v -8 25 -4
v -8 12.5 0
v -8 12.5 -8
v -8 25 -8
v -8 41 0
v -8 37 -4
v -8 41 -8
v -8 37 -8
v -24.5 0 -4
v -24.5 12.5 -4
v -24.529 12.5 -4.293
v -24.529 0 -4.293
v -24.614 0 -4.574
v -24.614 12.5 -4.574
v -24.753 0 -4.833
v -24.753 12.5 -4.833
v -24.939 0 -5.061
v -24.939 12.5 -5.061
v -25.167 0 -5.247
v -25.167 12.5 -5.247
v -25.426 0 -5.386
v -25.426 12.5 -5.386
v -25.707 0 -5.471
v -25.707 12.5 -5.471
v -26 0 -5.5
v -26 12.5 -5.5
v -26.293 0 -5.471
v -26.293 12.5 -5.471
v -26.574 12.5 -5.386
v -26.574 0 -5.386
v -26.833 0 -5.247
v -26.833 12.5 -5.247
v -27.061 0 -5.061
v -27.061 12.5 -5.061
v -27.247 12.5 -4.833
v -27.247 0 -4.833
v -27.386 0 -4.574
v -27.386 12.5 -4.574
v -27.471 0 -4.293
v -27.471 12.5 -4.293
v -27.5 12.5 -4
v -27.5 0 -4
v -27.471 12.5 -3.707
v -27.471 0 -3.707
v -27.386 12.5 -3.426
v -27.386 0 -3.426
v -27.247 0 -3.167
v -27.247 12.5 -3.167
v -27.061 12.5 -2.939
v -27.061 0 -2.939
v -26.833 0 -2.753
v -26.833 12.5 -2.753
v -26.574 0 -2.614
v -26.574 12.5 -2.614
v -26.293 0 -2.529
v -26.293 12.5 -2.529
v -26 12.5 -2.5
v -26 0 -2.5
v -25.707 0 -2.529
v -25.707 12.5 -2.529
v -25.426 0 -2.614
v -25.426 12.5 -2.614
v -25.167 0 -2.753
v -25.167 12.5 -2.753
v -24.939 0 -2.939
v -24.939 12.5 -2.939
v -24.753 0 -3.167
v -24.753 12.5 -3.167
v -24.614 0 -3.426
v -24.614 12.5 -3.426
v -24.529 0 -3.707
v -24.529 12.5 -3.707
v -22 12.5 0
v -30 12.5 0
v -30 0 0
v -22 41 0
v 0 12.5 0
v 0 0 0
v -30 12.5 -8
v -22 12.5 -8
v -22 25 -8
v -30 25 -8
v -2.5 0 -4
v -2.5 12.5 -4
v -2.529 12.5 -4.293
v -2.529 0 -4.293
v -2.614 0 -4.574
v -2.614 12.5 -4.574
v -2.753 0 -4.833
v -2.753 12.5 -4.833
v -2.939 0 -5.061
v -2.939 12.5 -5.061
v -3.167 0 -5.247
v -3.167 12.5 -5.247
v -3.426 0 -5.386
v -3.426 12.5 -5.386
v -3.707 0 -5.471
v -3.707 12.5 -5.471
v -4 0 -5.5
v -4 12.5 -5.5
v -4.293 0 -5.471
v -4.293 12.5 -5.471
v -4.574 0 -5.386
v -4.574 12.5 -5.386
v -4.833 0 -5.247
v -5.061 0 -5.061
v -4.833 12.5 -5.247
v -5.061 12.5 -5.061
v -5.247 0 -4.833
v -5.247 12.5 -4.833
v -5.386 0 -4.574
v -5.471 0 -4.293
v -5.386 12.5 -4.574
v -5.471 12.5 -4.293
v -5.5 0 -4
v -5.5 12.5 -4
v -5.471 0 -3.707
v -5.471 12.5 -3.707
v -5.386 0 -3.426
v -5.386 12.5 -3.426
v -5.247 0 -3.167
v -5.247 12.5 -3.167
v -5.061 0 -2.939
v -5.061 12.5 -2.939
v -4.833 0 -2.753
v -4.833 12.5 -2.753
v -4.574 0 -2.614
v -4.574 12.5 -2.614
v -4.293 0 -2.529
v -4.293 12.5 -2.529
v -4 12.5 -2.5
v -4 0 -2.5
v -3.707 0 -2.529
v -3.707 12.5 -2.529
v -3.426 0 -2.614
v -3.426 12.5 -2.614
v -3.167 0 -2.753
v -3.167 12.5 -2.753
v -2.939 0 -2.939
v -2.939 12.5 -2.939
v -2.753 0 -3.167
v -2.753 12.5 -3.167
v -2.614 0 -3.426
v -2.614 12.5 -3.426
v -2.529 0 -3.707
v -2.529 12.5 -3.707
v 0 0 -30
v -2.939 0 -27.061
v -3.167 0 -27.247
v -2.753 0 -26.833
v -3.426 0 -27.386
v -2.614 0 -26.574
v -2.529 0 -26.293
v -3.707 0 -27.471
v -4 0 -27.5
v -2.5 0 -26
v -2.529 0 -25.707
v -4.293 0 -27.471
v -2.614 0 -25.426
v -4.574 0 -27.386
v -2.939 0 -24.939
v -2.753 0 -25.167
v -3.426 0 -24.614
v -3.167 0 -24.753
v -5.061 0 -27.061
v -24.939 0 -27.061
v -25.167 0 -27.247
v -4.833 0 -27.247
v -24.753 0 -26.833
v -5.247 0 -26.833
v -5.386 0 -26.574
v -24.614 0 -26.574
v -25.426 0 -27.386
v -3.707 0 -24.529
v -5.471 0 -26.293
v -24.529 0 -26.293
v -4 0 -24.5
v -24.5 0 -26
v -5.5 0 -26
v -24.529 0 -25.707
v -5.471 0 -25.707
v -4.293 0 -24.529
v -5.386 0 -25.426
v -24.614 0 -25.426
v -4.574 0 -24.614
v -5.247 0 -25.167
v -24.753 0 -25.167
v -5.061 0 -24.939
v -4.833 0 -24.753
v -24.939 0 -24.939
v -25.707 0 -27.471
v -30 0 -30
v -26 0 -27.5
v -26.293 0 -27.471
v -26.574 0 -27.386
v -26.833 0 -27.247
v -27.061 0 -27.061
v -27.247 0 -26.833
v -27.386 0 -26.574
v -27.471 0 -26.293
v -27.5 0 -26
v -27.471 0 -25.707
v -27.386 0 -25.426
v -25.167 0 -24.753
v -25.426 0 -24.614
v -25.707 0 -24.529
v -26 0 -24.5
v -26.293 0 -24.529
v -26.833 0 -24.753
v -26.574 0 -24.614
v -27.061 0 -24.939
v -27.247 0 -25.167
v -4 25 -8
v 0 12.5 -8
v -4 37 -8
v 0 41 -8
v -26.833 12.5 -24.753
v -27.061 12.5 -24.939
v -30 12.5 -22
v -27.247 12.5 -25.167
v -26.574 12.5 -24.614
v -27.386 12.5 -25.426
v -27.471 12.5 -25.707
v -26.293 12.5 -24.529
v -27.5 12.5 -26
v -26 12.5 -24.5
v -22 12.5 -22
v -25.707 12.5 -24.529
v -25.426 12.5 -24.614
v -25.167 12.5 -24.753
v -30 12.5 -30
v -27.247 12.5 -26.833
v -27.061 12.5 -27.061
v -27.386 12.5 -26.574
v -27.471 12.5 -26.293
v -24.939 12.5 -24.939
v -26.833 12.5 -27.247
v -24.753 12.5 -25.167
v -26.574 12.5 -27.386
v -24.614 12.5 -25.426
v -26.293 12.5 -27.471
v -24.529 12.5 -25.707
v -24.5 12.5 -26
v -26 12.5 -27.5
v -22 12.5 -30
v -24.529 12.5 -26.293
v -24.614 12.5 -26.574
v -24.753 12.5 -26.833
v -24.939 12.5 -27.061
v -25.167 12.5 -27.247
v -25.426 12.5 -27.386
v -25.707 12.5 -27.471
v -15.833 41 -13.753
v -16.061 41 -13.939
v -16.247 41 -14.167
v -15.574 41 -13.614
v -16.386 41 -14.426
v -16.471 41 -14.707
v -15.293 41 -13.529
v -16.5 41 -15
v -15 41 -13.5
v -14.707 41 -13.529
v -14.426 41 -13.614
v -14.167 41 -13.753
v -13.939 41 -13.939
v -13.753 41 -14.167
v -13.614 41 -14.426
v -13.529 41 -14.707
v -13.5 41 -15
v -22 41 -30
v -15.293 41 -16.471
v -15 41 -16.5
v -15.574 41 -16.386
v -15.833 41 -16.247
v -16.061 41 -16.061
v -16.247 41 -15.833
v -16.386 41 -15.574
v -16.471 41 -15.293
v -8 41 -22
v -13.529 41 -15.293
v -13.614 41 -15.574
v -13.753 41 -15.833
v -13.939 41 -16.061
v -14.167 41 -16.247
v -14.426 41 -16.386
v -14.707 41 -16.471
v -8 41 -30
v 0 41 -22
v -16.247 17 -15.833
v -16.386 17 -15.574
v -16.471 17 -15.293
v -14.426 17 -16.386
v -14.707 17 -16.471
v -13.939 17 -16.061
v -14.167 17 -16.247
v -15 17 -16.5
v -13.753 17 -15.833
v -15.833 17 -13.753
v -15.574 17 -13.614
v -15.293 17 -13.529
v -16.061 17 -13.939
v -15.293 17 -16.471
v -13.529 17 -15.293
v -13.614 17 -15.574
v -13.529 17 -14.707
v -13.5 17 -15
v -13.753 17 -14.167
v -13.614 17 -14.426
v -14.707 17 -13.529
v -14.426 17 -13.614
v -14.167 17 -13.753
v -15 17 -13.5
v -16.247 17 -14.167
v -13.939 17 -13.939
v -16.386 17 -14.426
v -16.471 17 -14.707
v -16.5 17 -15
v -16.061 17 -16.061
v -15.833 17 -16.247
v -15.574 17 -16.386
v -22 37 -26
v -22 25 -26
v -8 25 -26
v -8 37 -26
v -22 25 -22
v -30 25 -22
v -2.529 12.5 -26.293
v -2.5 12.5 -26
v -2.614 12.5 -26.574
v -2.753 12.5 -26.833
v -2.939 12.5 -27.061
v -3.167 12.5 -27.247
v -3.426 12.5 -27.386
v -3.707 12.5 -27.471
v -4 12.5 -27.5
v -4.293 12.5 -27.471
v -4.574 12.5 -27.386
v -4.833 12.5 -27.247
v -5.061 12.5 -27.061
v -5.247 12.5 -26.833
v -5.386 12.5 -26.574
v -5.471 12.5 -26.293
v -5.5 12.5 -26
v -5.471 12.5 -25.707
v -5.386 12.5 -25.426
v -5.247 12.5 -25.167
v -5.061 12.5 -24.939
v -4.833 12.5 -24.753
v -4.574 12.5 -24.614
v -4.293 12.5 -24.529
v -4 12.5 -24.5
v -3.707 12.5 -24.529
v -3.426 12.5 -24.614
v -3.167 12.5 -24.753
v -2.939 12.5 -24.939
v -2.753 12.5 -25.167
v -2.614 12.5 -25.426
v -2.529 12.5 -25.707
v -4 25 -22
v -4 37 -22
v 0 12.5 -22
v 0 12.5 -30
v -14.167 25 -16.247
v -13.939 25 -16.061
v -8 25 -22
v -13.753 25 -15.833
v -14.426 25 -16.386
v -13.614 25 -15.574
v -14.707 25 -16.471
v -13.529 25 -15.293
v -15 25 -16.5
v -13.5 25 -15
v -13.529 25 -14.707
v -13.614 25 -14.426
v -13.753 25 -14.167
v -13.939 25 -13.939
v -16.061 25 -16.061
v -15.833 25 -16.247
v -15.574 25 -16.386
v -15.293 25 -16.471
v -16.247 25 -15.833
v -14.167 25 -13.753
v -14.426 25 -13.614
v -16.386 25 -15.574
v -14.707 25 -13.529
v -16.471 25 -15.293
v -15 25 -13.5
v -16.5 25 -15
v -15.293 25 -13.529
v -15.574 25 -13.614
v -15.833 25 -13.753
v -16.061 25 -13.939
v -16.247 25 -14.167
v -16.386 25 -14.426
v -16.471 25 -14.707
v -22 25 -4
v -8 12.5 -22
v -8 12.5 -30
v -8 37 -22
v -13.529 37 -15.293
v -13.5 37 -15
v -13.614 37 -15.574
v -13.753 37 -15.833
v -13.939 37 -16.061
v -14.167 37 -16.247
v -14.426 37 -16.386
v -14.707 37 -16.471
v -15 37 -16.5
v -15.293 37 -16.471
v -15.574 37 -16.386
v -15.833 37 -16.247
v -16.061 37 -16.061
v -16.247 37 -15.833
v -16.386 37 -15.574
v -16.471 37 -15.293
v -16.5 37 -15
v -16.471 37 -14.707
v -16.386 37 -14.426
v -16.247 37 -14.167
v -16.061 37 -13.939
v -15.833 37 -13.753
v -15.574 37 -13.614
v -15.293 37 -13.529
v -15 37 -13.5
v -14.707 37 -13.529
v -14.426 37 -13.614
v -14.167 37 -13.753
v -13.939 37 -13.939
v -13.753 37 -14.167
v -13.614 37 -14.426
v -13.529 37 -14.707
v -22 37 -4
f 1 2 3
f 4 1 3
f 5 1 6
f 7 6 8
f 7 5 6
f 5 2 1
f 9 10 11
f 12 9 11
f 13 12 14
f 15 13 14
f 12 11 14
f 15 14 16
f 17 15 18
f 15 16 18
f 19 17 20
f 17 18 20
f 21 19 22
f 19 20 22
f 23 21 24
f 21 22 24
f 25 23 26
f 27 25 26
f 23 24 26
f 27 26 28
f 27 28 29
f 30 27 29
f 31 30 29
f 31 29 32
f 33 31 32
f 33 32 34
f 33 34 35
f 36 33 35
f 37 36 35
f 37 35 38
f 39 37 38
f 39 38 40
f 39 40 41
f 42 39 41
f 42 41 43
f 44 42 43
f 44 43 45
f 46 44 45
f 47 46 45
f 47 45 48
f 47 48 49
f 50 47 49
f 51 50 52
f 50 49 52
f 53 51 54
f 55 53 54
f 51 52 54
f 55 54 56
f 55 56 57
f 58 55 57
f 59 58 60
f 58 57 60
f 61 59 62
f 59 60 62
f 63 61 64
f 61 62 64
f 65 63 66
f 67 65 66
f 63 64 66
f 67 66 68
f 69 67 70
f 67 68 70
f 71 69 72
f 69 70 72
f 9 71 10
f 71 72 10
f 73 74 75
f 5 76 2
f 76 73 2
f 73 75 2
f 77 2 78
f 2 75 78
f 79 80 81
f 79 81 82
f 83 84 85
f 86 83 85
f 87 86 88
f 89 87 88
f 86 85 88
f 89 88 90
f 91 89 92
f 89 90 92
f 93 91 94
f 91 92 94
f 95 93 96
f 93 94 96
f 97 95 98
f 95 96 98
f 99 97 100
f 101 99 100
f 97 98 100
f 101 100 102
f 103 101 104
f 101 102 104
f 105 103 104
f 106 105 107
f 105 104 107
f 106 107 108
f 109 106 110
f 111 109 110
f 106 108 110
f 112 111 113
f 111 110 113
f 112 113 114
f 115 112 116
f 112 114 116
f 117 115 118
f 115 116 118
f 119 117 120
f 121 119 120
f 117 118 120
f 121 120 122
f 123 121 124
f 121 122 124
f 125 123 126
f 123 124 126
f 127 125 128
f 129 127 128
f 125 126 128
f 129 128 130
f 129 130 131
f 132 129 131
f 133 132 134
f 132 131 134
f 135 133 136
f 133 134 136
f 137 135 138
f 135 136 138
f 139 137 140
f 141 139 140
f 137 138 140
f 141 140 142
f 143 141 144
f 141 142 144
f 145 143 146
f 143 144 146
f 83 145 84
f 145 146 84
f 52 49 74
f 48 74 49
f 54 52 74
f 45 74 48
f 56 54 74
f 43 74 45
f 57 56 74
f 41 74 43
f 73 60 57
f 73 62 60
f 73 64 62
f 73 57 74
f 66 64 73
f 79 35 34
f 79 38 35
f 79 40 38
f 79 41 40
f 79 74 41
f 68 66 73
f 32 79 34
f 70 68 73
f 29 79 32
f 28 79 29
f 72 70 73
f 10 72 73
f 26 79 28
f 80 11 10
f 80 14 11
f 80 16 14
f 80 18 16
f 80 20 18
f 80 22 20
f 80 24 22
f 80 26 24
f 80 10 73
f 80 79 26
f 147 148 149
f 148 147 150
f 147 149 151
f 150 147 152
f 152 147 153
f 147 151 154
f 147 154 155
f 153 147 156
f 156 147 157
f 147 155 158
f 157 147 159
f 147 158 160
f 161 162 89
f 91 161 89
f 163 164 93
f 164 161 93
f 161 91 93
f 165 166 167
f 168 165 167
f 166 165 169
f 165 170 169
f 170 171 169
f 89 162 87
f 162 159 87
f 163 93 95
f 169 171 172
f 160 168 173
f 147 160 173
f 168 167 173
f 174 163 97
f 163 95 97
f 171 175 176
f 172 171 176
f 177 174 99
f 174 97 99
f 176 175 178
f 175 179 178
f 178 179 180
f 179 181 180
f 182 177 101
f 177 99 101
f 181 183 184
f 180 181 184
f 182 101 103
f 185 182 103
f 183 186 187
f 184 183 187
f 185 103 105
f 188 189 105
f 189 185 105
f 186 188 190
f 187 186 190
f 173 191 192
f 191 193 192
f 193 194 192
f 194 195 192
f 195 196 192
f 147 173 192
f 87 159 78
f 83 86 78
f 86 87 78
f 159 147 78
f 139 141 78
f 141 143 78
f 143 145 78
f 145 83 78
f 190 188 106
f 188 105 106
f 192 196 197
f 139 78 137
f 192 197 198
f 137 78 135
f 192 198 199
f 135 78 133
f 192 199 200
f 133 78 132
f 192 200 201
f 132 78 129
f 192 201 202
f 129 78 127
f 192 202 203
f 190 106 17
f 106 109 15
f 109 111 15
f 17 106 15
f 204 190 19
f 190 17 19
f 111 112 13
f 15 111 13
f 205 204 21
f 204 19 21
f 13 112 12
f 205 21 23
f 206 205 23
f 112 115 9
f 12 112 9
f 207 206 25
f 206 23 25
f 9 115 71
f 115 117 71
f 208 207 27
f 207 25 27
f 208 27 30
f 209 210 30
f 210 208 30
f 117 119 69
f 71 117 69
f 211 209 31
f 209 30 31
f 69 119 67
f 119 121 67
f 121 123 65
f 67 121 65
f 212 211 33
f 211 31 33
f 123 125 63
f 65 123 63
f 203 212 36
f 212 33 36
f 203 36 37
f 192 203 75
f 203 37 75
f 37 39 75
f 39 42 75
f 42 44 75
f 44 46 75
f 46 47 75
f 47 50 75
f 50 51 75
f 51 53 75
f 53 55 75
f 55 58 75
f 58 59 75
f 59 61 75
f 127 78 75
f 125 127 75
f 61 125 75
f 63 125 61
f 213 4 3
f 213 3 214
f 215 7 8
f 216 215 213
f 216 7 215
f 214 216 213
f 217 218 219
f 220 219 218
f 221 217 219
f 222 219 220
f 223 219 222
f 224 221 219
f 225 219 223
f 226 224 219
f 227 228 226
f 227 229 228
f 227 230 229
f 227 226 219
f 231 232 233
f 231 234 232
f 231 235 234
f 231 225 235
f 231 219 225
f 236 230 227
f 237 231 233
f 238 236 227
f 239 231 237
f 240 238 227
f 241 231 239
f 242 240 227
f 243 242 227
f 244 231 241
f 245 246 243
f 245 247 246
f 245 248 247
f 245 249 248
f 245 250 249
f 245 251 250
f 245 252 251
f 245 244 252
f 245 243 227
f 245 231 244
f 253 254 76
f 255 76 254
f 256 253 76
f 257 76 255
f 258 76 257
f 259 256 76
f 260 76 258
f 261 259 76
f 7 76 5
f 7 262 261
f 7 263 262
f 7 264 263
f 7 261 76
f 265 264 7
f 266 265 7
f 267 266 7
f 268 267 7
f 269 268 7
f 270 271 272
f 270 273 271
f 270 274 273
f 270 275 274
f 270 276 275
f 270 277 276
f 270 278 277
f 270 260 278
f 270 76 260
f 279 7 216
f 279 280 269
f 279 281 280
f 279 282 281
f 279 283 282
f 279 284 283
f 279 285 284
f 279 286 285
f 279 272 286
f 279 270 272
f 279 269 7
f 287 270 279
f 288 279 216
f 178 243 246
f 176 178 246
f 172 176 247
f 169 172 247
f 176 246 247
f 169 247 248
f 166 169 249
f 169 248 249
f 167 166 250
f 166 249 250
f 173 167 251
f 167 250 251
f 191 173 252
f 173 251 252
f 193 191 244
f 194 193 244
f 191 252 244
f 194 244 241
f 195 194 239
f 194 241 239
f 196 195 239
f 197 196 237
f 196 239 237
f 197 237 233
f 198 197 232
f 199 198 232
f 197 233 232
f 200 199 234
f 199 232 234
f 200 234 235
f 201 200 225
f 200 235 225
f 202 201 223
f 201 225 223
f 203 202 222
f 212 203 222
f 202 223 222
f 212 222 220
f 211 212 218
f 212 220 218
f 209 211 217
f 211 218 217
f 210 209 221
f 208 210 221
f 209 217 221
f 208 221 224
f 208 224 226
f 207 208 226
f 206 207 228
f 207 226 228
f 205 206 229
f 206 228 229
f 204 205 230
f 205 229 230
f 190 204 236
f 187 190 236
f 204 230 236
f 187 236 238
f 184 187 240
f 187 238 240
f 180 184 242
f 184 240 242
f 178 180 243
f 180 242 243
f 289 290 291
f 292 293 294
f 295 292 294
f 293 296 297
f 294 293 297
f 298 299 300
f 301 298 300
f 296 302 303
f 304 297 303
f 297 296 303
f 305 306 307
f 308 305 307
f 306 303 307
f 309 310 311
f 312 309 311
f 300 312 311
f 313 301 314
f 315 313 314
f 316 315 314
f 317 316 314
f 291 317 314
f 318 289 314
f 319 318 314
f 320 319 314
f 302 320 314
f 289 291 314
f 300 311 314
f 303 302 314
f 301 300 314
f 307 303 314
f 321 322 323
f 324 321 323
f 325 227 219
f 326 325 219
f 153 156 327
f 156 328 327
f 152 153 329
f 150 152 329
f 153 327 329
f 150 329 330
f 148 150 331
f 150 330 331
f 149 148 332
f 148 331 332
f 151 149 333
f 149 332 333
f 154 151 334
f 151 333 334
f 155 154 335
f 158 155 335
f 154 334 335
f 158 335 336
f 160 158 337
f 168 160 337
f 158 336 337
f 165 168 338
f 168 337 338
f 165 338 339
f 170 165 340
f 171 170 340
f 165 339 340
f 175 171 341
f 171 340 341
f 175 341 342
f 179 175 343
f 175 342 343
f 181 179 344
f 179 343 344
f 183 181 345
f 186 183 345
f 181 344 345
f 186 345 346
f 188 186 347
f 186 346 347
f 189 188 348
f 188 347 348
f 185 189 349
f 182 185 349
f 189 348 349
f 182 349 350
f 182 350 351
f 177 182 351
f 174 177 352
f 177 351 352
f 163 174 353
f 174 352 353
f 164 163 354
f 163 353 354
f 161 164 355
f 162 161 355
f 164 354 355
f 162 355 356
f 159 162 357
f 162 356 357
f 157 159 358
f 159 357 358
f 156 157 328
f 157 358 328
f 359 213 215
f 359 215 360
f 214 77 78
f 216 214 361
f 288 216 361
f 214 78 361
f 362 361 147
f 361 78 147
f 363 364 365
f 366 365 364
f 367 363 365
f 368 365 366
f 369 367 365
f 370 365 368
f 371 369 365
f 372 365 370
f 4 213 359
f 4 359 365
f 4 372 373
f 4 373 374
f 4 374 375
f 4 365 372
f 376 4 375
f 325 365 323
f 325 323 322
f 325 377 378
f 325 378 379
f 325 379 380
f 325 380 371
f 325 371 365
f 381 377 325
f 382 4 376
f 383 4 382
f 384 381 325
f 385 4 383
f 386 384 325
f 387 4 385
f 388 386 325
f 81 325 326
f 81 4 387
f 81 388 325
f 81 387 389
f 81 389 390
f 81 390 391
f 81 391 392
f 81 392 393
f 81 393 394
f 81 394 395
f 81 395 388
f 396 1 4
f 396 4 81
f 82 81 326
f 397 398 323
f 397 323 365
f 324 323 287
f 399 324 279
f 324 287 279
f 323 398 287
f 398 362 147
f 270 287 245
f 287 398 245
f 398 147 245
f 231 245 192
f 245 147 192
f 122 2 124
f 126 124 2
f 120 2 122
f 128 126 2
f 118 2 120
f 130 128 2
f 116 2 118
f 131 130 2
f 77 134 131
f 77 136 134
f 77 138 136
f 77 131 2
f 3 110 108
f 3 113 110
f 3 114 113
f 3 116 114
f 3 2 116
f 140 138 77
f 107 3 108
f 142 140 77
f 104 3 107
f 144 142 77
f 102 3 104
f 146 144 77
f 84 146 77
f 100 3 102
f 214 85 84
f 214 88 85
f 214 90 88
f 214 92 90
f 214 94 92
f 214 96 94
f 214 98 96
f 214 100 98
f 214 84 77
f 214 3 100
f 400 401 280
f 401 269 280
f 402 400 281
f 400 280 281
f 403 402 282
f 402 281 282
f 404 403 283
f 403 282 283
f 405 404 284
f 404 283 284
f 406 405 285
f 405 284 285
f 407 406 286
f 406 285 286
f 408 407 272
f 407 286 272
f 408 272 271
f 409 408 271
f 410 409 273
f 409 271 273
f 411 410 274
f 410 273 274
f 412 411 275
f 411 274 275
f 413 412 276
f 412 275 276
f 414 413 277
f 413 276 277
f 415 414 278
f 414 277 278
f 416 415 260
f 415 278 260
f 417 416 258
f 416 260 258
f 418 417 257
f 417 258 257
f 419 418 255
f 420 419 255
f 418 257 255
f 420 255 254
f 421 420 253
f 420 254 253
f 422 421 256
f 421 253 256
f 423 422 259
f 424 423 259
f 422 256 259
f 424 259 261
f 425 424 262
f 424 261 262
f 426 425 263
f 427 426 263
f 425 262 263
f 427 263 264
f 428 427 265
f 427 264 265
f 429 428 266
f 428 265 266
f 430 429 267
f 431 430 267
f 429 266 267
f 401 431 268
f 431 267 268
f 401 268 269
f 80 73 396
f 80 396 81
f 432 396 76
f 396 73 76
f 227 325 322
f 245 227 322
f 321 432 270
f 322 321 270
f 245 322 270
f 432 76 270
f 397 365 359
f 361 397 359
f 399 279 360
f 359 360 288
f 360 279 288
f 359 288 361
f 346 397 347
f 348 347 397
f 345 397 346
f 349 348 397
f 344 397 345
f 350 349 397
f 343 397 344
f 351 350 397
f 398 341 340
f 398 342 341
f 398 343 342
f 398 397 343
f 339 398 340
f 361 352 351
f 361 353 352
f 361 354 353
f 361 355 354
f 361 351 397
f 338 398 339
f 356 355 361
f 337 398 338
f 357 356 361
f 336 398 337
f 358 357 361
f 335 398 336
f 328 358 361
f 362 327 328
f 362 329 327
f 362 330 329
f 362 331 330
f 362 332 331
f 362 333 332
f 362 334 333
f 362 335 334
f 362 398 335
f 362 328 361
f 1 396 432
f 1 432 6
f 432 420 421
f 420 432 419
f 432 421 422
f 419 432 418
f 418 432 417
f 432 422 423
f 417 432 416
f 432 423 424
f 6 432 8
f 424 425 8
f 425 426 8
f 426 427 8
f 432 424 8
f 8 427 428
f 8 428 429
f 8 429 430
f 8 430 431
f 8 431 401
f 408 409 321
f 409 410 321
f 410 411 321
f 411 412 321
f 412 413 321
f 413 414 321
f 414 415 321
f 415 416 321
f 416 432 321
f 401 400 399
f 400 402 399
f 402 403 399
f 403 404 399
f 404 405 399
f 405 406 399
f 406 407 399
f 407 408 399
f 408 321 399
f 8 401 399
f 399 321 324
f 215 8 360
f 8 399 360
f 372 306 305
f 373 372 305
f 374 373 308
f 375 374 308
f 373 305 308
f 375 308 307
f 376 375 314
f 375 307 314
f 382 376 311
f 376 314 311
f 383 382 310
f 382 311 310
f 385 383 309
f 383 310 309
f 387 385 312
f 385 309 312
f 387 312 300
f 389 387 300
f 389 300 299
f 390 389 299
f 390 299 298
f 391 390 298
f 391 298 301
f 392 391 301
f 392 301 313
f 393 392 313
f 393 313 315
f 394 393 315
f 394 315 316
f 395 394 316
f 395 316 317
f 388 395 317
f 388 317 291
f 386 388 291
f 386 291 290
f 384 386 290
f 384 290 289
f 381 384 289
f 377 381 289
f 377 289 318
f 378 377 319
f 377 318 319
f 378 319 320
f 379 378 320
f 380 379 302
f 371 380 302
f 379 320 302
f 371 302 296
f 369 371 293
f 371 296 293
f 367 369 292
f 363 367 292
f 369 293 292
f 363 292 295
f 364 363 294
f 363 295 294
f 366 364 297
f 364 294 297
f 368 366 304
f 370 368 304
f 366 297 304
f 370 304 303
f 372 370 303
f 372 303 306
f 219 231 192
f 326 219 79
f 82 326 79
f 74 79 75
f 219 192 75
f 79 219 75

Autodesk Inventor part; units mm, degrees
ref_plane "YZ Plane" through (0, 0, 0) normal (1, 0, 0) x (0, 1, 0)
ref_plane "XZ Plane" through (0, 0, 0) normal (0, 1, 0) x (-1, 0, 0)
ref_plane "XY Plane" through (0, 0, 0) normal (0, 0, 1) x (1, 0, 0)
sketch "Sketch1" plane through (0, 0, 0) normal (0, 1, 0) x (-1, 0, 0)
  line L0 (0, 0) -> (0, -30)
  line L1 (0, -30) -> (30, -30)
  line L2 (30, -30) -> (30, 0)
  line L3 (30, 0) -> (0, 0)
  point P0 (0, -15)
  point P1 (15, 0)
  dimension "d0" = 30
  dimension "d1" = 30
extrude "Extrusion2" add sketch "Sketch1" along normal blind 25
sketch "Sketch5" plane through (0, 25, 0) normal (0, 1, 0) x (1, 0, 0)
  line L0 (0, 0) -> (-8, 0)
  line L1 (-8, 0) -> (-8, 8)
  line L2 (-8, 8) -> (0, 8)
  line L3 (0, 8) -> (0, 0)
  line L4 (0, 30) -> (-8, 30)
  line L5 (-8, 30) -> (-8, 22)
  line L6 (-8, 22) -> (0, 22)
  line L7 (0, 22) -> (0, 30)
  line L8 (-30, 30) -> (-22, 30)
  line L9 (-22, 30) -> (-22, 22)
  line L10 (-22, 22) -> (-30, 22)
  line L11 (-30, 22) -> (-30, 30)
  line L12 (-30, 0) -> (-22, 0)
  line L13 (-22, 0) -> (-22, 8)
  line L14 (-22, 8) -> (-30, 8)
  line L15 (-30, 8) -> (-30, 0)
  dimension "d22" = 8
  dimension "d23" = 8
  dimension "d24" = 8
  dimension "d25" = 8
  dimension "d26" = 8
  dimension "d27" = 8
  dimension "d28" = 8
  dimension "d29" = 8
extrude "Extrusion6" cut sketch "Sketch5" against normal blind 12.5
sketch "Sketch6" plane through (0, 12.5, 0) normal (0, 1, 0) x (1, 0, 0)
  circle A0 centre (-4, 4) radius 1.5
  circle A1 centre (-26, 4) radius 1.5
  circle A2 centre (-4, 26) radius 1.5
  circle A3 centre (-26, 26) radius 1.5
  point P0 (0, 0)
  dimension "d32" = 3
  dimension "d33" = 3
  dimension "d34" = 3
  dimension "d35" = 3
extrude "Extrusion7" cut sketch "Sketch6" against normal up to next
sketch "Sketch7" plane through (0, 0, 0) normal (0, -1, 0) x (1, 0, 0)
  circle A0 centre (-15, -15) radius 4
  point P0 (0, 0)
  dimension "d38" = 8
ref_plane "Work Plane1" through (-15, 20, -15) normal (0, -1, 0) x (1, 0, 0)
sketch "Sketch8" plane through (-15, 20, -15) normal (0, -1, 0) x (1, 0, 0)
  circle A0 centre (0, 0) radius 1.5
  point P0 (15, 15)
  dimension "d41" = 3
extrude "Extrusion9" cut sketch "Sketch8" against normal blind 5 and the other way blind 3
sketch "Sketch9" plane through (0, 25, 0) normal (0, 1, 0) x (1, 0, 0)
  line L0 (0, 22) -> (-8, 22)
  line L1 (-8, 22) -> (-8, 30) projected
  line L2 (-8, 22) -> (-8, 30)
  line L3 (0, 22) -> (0, 8)
  line L4 (0, 8) -> (0, 22) projected
  line L5 (0, 8) -> (-4, 8)
  line L6 (-8, 8) -> (0, 8) projected
  line L7 (-4, 8) -> (-4, 22)
  line L8 (0, 22) -> (-8, 22) projected
  line L9 (-8, 30) -> (-22, 30)
  line L10 (0, 30) -> (-30, 30) projected
  line L11 (-22, 30) -> (-22, 26)
  line L12 (-22, 30) -> (-22, 22) projected
  line L13 (-22, 26) -> (-8, 26)
  line L14 (-8, 0) -> (-22, 0)
  line L15 (-30, 0) -> (0, 0) projected
  line L16 (-22, 0) -> (-22, 4)
  line L17 (-22, 8) -> (-22, 0) projected
  line L18 (-22, 4) -> (-8, 4)
  line L19 (-8, 0) -> (-8, 8) projected
  line L20 (-8, 4) -> (-8, 0)
  dimension "d46" = 4
  dimension "d47" = 14
extrude "Extrusion10" add sketch "Sketch9" along normal blind 16
sketch "Sketch12" plane through (0, 41, 0) normal (0, 1, 0) x (1, 0, 0)
  line L0 (-8, 0) -> (-8, 30)
  line L1 (-8, 30) -> (-22, 30)
  line L2 (-22, 30) -> (-22, 0)
  line L3 (-22, 8) -> (-22, 0) projected
  line L4 (-22, 0) -> (-8, 0)
  line L5 (0, 8) -> (-8, 8)
  line L6 (-8, 8) -> (-8, 22)
  line L7 (-8, 22) -> (-8, 30) projected
  line L8 (-8, 22) -> (0, 22)
  line L9 (0, 22) -> (0, 8)
  circle A0 centre (-15, 15) radius 1.5
  point P0 (0, 0)
  point P1 (-22, 15)
  point P2 (-15, 0)
  dimension "d52" = 3
extrude "Extrusion12" add sketch "Sketch12" against normal blind 4
properties part number "dop_krepl_k_sponke_ne_motora"
